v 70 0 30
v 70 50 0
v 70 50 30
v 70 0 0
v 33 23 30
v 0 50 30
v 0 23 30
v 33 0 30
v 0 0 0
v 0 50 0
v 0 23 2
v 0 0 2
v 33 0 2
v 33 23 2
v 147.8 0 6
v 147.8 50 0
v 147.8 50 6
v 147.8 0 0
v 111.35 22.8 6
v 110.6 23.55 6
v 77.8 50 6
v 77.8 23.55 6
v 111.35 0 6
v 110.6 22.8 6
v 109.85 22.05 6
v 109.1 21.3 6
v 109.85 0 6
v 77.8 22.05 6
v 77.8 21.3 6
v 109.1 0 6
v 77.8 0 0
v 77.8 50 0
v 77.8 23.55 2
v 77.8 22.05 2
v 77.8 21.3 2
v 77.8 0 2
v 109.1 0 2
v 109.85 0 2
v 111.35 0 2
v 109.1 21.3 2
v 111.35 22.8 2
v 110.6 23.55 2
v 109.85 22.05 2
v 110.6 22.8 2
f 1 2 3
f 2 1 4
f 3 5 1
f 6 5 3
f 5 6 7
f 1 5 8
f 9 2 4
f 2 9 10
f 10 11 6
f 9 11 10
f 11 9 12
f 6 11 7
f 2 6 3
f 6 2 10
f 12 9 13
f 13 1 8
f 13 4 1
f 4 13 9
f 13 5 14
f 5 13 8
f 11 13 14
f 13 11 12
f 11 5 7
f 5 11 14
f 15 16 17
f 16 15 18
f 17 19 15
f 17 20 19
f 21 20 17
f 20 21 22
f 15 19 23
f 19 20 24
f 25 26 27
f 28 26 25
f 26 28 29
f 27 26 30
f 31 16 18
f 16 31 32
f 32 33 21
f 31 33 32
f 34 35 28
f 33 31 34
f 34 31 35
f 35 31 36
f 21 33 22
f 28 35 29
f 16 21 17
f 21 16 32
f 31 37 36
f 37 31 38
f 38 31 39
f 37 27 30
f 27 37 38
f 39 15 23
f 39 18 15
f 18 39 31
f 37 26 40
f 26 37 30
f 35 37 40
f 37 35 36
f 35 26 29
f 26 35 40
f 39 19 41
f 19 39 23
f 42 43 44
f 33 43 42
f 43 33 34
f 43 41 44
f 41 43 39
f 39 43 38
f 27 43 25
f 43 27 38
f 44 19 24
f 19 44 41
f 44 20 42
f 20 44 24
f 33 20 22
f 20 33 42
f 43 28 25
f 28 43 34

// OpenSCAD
// Two-part enclosure for small electronics board
// Part 1: Box (left)
// Part 2: Lid (right, printed upside down)
// Prints together with a 10 mm gap.
// Both parts rest on the bed (Z=0).

$fn = 128;

// --- Dimensions ---

// Box Dimensions (Outer)
BOX_X = 70;
BOX_Y = 50;
BOX_Z = 30;

// Wall and Floor Thickness
WALL_THICK = 2;
FLOOR_THICK = 2;

// Gap between parts
PART_GAP = 10;

// Lid Dimensions
// Plate thickness
LID_PLATE_THICK = 2;
// Lip dimensions
LIP_WALL_THICK = 1.5;
LIP_HEIGHT = 4;
// Lip outer size (matches box opening + clearance)
LIP_X_OUT = 65.6;
LIP_Y_OUT = 45.6;

// --- Helper Functions ---

// Create the Box (Part 1)
// Oriented: Rests on XY, builds +Z. Bottom at Z=0.
module create_box() {
    // Calculate inner dimensions
    inner_x = BOX_X - 2*WALL_THICK;
    inner_y = BOX_Y - 2*WALL_THICK;
    inner_z = BOX_Z - FLOOR_THICK; // Open top

    // Build box using difference
    difference() {
        // Outer block (Bottom at Z=0)
        cube([BOX_X, BOX_Y, BOX_Z]);
        
        // Cut out the inside (open top)
        // Hole starts at Z=FLOOR_THICK and goes up to Z=BOX_Z
        translate([
            -inner_x/2, 
            -inner_y/2, 
            FLOOR_THICK
        ]) {
            // Extend slightly past the top to ensure clean cut
            cube([inner_x, inner_y, inner_z + 0.1]);
        }
    }
}

// Create the Lid (Part 2)
// Oriented: Printed upside down. 
// Physical shape: A plate with a lip on top.
// Print orientation: Plate lies on bed (Z=0 to Z=2). Lip extends UP (Z=2 to Z=6).
// When flipped, the lip goes down into the box.
module create_lid() {
    // Plate dimensions
    plate_x = BOX_X;
    plate_y = BOX_Y;
    plate_z = LID_PLATE_THICK;

    // Lip dimensions (Outer)
    lip_x_out = LIP_X_OUT;
    lip_y_out = LIP_Y_OUT;
    lip_z = LIP_HEIGHT;
    lip_w = LIP_WALL_THICK;

    // Lip Inner dimensions (to match the cutout)
    lip_x_in = lip_x_out - 2*lip_w;
    lip_y_in = lip_y_out - 2*lip_w;

    difference() {
        // 1. The main solid block (Plate + Lip volume)
        // Dimensions: Width=plate_x, Depth=plate_y, Height=plate_z + lip_z
        cube([plate_x, plate_y, plate_z + lip_z]);

        // 2. The Lip (cut out from the top of the plate volume)
        // We subtract the volume of the lip channel.
        // The channel is defined by the inner void and the side walls.
        // Start cutting from the top surface of the plate (Z = plate_z)
        cut_z_start = plate_z;
        
        // Inner Void (the hole)
        translate([
            -lip_x_in/2, 
            -lip_y_in/2, 
            cut_z_start
        ]) {
            cube([lip_x_in, lip_y_in, lip_z + 0.1]);
        }
        
        // Side Walls (Left and Right relative to X)
        // Wall 1 (Left)
        translate([
            -lip_x_out/2 - lip_w/2, 
            -lip_y_out/2, 
            cut_z_start
        ]) {
            cube([lip_w, lip_y_out, lip_z + 0.1]);
        }
        // Wall 2 (Right)
        translate([
            lip_x_out/2 - lip_w/2, 
            -lip_y_out/2, 
            cut_z_start
        ]) {
            cube([lip_w, lip_y_out, lip_z + 0.1]);
        }
        
        // Side Walls (Front and Back relative to Y)
        // Wall 3 (Front)
        translate([
            -lip_x_out/2, 
            -lip_y_out/2 - lip_w/2, 
            cut_z_start
        ]) {
            cube([lip_x_out, lip_w, lip_z + 0.1]);
        }
        // Wall 4 (Back)
        translate([
            -lip_x_out/2, 
            lip_y_out/2 - lip_w/2, 
            cut_z_start
        ]) {
            cube([lip_x_out, lip_w, lip_z + 0.1]);
        }
    }
}

// --- Assembly ---

// Positioning:
// Box is centered at origin in X and Y.
// Box center X = 0. Box right edge = 35.
// Gap = 10.
// Lid left edge should be at 35 + 10 = 45.
// Lid center X = 45 + (LIP_X_OUT / 2) = 45 + 32.8 = 77.8.
// Both parts are translated to Z=0.

translate([0, 0, 0]) {
    create_box();
}

translate([
    BOX_X/2 + PART_GAP + LIP_X_OUT/2, 
    0, 
    0
]) {
    create_lid();
}
